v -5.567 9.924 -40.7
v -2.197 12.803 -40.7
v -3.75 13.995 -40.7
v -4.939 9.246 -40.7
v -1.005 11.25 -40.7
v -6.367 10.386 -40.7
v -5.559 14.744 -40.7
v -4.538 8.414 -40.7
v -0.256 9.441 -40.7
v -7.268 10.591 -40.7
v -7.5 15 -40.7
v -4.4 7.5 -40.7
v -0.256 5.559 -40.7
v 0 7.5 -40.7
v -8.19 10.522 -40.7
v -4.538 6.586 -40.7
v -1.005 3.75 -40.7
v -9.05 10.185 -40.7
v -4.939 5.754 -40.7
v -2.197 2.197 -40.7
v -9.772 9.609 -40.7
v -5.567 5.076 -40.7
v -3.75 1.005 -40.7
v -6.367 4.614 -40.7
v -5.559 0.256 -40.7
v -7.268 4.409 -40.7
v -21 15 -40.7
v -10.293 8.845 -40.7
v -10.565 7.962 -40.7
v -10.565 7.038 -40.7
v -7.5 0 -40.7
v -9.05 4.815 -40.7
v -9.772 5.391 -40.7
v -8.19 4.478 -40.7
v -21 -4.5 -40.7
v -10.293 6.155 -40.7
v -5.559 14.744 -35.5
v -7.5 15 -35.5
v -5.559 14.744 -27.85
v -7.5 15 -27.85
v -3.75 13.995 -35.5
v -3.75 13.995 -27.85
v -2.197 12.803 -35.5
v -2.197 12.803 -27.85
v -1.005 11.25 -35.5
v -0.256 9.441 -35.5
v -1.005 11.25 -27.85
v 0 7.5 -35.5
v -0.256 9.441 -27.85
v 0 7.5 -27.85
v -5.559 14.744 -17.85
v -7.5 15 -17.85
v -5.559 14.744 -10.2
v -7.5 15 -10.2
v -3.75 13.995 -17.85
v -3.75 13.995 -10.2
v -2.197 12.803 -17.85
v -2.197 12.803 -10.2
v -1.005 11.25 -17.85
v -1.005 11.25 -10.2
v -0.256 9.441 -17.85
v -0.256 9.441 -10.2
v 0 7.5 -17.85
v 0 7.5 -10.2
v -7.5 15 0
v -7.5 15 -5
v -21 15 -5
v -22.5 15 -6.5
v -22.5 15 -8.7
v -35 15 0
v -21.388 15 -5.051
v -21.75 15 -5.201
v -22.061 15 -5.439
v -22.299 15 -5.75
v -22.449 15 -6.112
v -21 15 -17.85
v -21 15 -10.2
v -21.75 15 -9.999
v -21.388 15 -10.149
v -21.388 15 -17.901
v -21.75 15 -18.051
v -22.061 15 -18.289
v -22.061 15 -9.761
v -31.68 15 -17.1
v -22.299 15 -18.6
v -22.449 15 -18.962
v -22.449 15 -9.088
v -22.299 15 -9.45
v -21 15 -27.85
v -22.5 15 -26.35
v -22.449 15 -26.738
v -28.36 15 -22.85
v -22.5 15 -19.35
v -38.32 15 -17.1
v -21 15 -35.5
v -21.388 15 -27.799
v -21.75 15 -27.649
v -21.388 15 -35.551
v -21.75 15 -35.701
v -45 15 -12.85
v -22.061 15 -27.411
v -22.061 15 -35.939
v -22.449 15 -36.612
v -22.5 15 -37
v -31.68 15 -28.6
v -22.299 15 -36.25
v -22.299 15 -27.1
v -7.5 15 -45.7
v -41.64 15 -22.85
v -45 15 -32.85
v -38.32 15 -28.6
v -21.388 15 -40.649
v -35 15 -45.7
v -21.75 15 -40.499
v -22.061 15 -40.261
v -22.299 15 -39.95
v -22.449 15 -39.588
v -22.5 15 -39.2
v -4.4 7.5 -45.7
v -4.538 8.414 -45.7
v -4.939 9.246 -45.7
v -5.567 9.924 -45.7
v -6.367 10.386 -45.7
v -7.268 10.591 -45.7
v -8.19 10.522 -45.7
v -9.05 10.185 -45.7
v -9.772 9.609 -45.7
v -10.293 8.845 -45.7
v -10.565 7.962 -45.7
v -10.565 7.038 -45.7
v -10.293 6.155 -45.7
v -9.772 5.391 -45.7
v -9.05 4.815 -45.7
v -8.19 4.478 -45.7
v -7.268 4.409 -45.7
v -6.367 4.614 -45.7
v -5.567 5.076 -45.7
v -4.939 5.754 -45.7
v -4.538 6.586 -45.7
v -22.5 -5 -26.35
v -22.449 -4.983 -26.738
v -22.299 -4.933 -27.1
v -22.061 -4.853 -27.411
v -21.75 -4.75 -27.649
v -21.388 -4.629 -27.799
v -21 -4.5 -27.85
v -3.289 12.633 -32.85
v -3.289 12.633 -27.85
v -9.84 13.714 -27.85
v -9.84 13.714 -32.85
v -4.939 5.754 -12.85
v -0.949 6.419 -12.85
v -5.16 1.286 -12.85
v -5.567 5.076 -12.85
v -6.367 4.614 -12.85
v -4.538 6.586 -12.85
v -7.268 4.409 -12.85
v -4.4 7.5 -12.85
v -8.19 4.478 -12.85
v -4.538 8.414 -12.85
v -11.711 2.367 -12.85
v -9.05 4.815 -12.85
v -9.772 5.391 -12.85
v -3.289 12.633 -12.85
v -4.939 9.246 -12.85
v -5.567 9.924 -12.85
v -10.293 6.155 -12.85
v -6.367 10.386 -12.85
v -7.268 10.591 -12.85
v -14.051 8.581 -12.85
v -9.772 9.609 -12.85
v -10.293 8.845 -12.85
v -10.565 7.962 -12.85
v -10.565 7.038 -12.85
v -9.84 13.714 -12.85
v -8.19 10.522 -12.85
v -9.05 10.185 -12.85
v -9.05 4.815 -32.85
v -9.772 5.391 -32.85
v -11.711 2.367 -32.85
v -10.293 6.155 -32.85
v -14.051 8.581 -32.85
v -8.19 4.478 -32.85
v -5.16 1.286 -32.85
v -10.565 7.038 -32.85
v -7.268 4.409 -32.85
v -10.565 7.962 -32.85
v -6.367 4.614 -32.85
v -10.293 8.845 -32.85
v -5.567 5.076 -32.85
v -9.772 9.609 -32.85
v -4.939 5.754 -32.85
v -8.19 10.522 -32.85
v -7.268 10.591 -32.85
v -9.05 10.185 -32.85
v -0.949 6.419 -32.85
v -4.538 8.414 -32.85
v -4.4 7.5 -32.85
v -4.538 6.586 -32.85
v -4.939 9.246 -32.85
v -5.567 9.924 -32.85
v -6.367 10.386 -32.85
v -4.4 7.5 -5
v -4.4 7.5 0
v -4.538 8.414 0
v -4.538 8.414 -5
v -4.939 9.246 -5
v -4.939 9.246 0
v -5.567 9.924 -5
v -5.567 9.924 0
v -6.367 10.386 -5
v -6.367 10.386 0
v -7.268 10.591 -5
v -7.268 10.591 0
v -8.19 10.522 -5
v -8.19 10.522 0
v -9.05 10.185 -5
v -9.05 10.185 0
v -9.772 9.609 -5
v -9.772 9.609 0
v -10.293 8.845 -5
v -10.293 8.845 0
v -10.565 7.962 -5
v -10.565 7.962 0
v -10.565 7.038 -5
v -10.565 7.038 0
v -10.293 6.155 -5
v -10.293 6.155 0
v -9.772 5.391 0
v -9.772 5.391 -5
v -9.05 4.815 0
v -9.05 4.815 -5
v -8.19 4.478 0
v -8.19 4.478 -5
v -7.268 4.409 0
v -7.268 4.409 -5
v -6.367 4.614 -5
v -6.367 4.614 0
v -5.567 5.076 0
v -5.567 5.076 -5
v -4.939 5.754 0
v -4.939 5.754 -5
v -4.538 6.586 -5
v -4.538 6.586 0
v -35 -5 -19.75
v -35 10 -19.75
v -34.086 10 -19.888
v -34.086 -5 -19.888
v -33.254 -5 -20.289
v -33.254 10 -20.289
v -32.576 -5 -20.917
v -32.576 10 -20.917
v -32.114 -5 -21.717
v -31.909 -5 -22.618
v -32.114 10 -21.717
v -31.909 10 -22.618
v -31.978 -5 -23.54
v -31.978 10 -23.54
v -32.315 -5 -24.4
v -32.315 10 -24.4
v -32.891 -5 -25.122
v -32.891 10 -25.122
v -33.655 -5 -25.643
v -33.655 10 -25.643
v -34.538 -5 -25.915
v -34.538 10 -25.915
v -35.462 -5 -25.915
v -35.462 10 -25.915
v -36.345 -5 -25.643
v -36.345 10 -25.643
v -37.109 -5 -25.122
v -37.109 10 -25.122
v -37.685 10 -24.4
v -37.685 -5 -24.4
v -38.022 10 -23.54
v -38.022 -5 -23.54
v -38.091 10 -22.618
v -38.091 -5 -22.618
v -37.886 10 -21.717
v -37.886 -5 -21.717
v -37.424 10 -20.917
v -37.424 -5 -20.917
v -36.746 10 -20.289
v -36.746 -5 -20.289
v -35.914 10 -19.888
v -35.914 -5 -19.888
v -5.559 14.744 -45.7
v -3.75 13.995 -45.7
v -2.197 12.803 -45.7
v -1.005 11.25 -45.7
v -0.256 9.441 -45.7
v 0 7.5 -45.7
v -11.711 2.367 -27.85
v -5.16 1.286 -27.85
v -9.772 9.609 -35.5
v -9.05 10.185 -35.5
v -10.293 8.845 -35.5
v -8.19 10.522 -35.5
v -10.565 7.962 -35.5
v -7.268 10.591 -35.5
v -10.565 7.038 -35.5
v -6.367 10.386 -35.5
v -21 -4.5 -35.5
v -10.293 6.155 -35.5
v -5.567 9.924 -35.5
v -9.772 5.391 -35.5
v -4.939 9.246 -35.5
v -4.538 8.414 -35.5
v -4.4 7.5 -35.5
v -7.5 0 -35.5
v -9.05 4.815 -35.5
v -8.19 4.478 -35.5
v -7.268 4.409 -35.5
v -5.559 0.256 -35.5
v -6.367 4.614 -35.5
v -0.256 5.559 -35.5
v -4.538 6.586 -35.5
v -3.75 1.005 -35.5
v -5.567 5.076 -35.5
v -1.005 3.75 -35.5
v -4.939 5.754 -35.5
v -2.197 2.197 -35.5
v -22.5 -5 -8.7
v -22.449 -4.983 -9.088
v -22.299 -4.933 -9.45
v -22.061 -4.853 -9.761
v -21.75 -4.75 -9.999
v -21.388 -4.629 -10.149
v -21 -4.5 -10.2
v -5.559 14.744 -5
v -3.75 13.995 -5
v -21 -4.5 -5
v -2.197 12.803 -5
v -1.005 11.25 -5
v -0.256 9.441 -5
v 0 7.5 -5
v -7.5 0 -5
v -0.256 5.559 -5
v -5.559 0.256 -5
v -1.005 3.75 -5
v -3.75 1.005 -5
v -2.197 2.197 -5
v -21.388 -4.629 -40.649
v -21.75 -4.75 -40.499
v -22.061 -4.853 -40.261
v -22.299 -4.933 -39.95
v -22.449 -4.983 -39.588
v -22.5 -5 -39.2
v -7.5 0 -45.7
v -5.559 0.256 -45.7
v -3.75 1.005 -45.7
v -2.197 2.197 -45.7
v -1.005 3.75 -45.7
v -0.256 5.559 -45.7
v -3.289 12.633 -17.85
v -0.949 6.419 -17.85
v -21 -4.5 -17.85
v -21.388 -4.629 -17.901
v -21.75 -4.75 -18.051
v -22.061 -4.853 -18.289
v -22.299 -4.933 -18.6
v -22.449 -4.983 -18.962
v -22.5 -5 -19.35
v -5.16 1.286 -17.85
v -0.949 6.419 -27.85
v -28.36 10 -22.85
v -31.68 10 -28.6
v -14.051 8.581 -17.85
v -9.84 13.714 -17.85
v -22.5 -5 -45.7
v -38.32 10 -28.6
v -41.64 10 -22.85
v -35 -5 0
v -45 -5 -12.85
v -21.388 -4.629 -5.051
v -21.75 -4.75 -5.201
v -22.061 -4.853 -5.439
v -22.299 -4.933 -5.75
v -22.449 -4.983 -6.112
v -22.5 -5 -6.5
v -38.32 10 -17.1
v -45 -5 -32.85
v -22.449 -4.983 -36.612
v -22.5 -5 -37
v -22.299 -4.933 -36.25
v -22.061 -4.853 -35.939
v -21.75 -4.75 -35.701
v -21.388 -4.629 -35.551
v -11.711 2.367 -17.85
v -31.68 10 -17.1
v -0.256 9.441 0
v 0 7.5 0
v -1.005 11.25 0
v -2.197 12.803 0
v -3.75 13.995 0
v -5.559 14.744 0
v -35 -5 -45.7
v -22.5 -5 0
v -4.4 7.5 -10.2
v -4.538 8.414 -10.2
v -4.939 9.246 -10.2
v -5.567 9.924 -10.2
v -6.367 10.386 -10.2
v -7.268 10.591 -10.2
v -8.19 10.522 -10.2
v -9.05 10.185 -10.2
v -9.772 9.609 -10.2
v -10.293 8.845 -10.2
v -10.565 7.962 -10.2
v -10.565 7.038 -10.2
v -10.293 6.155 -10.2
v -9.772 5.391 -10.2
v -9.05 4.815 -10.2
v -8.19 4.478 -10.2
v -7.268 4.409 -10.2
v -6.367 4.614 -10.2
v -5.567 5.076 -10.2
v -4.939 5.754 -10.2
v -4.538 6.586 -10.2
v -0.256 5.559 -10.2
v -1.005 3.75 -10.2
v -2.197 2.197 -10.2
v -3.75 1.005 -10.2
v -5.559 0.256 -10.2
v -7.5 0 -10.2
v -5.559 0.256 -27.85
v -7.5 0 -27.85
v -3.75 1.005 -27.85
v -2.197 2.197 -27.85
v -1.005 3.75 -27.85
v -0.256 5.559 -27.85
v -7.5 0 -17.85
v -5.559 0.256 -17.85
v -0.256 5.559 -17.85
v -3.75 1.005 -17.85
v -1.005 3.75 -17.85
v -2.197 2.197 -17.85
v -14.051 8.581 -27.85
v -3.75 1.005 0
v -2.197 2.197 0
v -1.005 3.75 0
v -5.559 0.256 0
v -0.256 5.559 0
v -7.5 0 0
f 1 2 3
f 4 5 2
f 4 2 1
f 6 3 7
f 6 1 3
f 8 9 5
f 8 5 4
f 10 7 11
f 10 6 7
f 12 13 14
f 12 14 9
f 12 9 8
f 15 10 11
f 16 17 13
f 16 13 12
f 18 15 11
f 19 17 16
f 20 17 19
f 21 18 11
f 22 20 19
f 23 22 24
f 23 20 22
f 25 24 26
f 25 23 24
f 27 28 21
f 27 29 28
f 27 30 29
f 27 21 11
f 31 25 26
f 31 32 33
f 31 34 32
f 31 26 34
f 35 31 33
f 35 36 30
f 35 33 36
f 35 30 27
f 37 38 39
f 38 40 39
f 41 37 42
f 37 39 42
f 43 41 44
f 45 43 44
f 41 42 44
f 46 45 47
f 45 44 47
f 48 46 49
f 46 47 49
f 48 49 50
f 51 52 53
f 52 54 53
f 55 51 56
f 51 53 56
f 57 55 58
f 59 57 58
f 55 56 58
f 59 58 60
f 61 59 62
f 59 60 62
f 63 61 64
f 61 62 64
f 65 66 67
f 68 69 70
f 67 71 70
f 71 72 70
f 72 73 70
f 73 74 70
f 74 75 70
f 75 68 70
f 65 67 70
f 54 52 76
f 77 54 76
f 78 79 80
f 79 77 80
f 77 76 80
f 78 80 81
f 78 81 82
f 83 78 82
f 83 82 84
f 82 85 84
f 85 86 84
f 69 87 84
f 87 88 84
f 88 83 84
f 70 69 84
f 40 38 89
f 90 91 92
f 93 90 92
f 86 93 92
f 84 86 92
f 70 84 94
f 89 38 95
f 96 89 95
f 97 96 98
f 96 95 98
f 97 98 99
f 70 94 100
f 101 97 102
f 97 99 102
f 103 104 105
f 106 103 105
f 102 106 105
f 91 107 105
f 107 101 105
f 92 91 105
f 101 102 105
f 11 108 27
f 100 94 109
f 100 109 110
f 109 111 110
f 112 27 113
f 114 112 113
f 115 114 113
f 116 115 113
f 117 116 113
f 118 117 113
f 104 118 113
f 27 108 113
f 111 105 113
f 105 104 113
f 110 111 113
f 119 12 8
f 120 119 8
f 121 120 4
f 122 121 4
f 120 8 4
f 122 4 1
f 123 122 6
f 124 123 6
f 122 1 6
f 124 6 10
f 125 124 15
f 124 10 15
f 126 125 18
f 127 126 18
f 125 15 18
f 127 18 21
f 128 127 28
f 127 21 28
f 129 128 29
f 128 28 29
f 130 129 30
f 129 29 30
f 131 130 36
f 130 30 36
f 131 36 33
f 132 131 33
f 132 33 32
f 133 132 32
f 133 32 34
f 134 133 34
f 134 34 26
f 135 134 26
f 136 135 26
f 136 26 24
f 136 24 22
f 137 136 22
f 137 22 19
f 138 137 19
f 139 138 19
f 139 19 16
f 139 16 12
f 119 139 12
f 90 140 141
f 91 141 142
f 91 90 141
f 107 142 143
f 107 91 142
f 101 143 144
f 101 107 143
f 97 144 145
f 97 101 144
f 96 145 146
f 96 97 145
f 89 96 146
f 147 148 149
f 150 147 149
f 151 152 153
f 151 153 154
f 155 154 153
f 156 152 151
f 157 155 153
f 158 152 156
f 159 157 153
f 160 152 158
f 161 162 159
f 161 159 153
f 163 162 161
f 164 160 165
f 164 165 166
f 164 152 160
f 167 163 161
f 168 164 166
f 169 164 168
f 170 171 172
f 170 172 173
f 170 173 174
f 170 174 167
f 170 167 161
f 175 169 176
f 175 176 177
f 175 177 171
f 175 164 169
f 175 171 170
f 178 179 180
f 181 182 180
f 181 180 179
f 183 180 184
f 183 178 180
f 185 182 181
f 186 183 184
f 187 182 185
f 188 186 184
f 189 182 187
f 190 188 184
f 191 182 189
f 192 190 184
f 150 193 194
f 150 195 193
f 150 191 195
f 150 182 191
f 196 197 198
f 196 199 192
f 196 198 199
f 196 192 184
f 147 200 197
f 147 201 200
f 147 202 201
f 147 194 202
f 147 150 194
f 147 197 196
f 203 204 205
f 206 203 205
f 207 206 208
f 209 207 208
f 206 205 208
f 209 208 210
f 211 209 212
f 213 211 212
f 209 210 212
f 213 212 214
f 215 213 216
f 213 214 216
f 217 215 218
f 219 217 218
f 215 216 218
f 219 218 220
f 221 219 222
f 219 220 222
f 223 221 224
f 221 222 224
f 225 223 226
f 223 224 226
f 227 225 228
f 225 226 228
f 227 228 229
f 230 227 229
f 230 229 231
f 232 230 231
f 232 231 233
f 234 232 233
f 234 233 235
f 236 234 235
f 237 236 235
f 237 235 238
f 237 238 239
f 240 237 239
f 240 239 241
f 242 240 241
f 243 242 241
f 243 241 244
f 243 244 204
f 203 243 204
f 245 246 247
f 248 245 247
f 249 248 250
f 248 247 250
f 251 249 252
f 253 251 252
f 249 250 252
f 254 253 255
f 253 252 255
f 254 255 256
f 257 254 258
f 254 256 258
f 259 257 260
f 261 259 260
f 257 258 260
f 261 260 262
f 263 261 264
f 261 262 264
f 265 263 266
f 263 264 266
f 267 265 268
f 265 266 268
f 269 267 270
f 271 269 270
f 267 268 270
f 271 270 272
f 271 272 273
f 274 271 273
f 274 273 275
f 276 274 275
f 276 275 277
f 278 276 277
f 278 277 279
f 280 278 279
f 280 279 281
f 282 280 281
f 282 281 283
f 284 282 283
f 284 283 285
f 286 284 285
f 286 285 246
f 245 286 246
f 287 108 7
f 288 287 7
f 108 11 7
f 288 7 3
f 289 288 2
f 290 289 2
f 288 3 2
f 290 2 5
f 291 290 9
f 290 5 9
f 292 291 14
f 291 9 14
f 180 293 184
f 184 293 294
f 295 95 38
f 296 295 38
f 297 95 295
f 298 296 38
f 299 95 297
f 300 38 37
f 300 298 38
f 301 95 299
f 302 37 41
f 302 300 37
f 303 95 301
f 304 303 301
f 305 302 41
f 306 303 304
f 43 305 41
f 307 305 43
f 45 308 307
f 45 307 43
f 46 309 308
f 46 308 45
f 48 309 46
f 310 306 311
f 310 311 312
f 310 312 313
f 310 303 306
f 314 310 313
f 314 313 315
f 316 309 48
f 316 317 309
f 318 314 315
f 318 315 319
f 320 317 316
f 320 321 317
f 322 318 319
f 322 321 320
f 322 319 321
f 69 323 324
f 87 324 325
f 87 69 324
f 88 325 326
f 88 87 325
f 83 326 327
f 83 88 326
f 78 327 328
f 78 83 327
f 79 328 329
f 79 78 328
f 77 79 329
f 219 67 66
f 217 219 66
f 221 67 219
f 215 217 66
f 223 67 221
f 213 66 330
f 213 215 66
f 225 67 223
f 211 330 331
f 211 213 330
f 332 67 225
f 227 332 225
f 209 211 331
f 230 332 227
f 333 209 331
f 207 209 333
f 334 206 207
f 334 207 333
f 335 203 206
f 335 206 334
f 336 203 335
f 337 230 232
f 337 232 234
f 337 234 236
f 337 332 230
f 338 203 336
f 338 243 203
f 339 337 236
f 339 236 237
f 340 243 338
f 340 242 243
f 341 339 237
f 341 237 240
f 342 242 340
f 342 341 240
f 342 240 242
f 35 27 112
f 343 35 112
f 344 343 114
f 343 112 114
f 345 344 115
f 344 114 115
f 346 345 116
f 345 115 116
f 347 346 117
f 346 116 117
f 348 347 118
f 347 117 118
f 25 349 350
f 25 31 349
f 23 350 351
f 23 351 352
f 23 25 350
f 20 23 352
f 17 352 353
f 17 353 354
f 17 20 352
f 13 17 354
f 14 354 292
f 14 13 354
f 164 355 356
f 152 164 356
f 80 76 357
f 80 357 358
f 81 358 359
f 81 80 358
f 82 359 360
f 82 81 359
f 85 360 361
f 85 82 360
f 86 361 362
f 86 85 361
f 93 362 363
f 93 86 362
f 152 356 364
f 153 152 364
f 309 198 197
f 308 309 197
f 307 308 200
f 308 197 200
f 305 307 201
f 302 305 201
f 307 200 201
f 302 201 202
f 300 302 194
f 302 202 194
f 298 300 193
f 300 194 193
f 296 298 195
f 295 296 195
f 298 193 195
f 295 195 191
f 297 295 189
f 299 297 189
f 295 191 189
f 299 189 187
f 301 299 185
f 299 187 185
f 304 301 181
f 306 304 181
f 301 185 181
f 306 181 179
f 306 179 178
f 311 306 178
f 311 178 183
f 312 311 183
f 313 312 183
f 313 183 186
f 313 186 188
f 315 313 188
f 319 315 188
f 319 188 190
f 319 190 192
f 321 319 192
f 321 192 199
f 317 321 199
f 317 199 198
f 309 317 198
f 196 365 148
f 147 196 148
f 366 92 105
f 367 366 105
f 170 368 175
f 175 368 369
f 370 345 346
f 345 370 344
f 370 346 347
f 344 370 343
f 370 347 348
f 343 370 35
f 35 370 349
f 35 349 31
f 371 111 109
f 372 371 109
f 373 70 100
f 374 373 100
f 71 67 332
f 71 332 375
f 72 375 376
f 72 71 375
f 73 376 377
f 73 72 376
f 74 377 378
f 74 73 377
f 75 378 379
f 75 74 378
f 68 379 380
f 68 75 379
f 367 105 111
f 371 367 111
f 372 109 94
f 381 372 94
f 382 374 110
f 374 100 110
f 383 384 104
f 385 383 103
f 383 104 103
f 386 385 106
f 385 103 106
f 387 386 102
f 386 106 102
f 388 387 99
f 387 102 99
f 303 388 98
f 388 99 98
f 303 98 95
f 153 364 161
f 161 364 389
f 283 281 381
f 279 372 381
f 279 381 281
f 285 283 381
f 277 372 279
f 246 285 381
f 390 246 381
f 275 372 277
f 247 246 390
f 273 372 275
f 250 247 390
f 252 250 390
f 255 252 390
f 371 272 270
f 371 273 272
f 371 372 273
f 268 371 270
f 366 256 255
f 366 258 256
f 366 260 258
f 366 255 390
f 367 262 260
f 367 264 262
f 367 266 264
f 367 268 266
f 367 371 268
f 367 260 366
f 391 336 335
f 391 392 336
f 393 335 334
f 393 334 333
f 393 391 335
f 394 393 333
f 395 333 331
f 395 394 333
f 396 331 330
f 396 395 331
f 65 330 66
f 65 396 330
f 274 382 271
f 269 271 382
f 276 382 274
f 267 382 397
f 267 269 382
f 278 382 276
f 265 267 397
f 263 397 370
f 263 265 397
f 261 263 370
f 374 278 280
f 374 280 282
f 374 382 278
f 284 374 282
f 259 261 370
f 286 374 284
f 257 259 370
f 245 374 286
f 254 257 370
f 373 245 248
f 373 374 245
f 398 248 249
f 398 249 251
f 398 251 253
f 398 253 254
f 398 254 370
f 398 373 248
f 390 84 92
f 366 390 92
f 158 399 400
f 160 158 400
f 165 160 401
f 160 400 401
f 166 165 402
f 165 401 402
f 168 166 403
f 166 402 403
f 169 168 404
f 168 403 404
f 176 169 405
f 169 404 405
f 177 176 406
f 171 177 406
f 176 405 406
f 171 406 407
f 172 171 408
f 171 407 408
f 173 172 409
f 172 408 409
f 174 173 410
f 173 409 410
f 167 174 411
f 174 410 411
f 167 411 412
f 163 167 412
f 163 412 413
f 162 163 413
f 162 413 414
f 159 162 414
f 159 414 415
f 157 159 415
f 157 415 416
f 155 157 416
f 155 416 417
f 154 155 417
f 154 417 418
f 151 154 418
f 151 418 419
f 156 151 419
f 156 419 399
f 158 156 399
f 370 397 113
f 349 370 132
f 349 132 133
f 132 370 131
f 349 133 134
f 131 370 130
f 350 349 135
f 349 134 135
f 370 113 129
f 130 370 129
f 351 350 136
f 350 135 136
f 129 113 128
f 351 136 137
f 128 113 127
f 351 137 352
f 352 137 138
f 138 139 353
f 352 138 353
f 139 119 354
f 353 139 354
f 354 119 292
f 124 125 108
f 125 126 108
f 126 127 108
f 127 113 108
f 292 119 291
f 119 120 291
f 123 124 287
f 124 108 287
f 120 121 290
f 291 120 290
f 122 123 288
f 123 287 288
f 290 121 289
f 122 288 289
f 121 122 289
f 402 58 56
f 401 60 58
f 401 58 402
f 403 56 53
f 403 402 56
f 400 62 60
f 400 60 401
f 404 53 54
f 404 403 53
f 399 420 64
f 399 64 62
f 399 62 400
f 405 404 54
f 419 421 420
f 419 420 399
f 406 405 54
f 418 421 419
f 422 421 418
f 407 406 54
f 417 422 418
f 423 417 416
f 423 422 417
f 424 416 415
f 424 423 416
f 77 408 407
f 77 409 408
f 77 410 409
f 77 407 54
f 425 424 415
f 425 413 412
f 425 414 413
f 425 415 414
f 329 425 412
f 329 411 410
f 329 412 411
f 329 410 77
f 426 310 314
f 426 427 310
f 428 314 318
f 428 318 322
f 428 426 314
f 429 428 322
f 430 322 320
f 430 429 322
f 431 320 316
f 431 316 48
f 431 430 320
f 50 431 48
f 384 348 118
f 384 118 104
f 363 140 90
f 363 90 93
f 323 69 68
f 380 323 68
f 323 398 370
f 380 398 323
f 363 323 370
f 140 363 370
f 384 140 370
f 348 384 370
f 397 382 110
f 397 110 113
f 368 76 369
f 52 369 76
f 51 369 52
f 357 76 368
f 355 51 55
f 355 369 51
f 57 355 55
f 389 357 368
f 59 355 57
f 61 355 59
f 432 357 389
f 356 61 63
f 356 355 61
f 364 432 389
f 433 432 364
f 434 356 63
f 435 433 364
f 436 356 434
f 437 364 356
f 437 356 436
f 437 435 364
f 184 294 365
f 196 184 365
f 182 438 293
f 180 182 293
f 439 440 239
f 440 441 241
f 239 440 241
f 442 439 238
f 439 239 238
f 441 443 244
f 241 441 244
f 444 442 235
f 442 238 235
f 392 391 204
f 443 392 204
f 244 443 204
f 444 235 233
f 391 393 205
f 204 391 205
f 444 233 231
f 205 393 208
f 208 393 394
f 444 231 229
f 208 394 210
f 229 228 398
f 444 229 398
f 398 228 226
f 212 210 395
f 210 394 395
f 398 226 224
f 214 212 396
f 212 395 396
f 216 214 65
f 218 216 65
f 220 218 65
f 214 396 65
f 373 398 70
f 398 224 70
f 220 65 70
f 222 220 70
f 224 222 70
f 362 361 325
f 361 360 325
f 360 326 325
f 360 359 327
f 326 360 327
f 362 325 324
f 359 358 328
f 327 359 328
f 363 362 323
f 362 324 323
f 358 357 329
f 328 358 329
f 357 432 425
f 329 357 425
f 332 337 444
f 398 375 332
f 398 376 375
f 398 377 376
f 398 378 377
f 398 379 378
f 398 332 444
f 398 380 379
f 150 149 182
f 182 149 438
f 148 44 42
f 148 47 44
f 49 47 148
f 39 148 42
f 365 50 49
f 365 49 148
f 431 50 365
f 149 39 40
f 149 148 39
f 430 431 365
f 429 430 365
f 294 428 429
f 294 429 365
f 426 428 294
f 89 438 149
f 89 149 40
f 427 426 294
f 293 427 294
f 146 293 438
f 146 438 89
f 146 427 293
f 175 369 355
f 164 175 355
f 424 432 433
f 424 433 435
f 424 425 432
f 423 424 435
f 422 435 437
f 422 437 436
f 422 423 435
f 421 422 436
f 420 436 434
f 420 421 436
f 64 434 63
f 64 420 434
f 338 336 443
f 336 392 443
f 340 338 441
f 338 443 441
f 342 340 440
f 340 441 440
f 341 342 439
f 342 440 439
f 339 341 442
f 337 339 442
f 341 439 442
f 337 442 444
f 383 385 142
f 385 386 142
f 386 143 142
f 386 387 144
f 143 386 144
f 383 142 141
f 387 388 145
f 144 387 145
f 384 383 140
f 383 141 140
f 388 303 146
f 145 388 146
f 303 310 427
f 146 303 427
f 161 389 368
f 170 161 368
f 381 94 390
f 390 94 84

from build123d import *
from OCP.BRepFilletAPI import BRepFilletAPI_MakeChamfer

# Parameters (mm, degrees)
BOSS_EXTRUDE1_DEPTH = 15
CUT_EXTRUDE4_DEPTH  = 5
SKETCH7_R           = 3.1
CUT_EXTRUDE6_DEPTH  = 66.86721491
FILLET1_R           = 7.5
CUT_EXTRUDE7_DEPTH  = 5
CUT_EXTRUDE8_DEPTH  = 5
FILLET2_R           = 1.5
BOSS_EXTRUDE2_DEPTH = 5
SKETCH6_R           = 3.1
CUT_EXTRUDE5_DEPTH  = 66.86721491
CHAMFER8_SIZE       = 15
CHAMFER8_SIZE_2     = 5


with BuildPart() as part:
    # Sketch1 → Boss-Extrude1 (new body)
    with BuildSketch(Plane(origin=(0, 0, 0), x_dir=(1, 0, 0), z_dir=(0, 1, 0))):
        Polygon((0, 0), (-35, 0), (-45, 12.85), (-45, 32.85), (-35, 45.7), (0, 45.7), (0, 40.7), (-22.5, 40.7), (-22.5, 35.5), (0, 35.5), (0, 27.85), (-22.5, 27.85), (-22.5, 17.85), (0, 17.85), (0, 10.2), (-22.5, 10.2), (-22.5, 5), (0, 5), align=None)
    extrude(amount=BOSS_EXTRUDE1_DEPTH)

    # Sketch5 → Cut-Extrude4 (cut)
    with BuildSketch(Plane(origin=(0, 15, 0), x_dir=(1, 0, 0), z_dir=(0, 1, 0))):
        Polygon((-41.639528096, 22.85), (-38.319764048, 17.1), (-31.680235952, 17.1), (-28.360471904, 22.85), (-31.680235952, 28.6), (-38.319764048, 28.6), align=None)
    extrude(amount=-CUT_EXTRUDE4_DEPTH, mode=Mode.SUBTRACT)

    # Sketch7 → Cut-Extrude6 (cut, through all)
    with BuildSketch(Plane.XY):
        with Locations((-7.5, 7.5)):
            Circle(SKETCH7_R)
    extrude(amount=-CUT_EXTRUDE6_DEPTH, mode=Mode.SUBTRACT)

    # Fillet1
    fillet1_edges = [part.edges().sort_by_distance(p)[0] for p in [
        (0, 0, -43.2),
        (0, 0, -31.675),
        (0, 0, -2.5),
        (0, 15, -43.2),
        (0, 15, -31.675),
        (0, 15, -2.5),
        (0, 0, -14.025),
        (0, 15, -14.025),
    ]]
    fillet(fillet1_edges, radius=FILLET1_R - 0.0001)  # a hair under: the kernel refuses the full size

    # Sketch8 → Cut-Extrude7 (cut)
    with BuildSketch(Plane.XY.offset(-27.85)):
        Polygon((-9.839641819, 13.713647036), (-14.050997093, 8.580634267), (-11.711355274, 2.366987231), (-5.160358181, 1.286352964), (-0.949002907, 6.419365733), (-3.288644726, 12.633012769), align=None)
    extrude(amount=-CUT_EXTRUDE7_DEPTH, mode=Mode.SUBTRACT)

    # Sketch9 → Cut-Extrude8 (cut)
    with BuildSketch(Plane(origin=(0, 0, -17.85), x_dir=(-1, 0, 0), z_dir=(0, 0, -1))):
        Polygon((9.839641819, 13.713647036), (3.288644726, 12.633012769), (0.949002907, 6.419365733), (5.160358181, 1.286352964), (11.711355274, 2.366987231), (14.050997093, 8.580634267), align=None)
    extrude(amount=-CUT_EXTRUDE8_DEPTH, mode=Mode.SUBTRACT)

    # Fillet2
    fillet2_edges = [part.edges().sort_by_distance(p)[0] for p in [
        (-22.5, 7.5, -40.7),
        (-22.5, 7.5, -35.5),
        (-22.5, 7.5, -27.85),
        (-22.5, 7.5, -17.85),
        (-22.5, 7.5, -10.2),
        (-22.5, 7.5, -5),
    ]]
    fillet(fillet2_edges, radius=FILLET2_R)

    # Sketch15 → Boss-Extrude2 (add)
    with BuildSketch(Plane.XZ):
        Polygon((-35, 0), (-45, -12.85), (-45, -32.85), (-35, -45.7), (-22.5, -45.7), (-22.5, 0), align=None)
    extrude(amount=BOSS_EXTRUDE2_DEPTH)

    # Sketch6 → Cut-Extrude5 (cut, through all)
    with BuildSketch(Plane(origin=(0, 10, 0), x_dir=(1, 0, 0), z_dir=(0, 1, 0))):
        with Locations(Location((-35, 22.85, 0), (0, 0, 270))):
            Circle(SKETCH6_R)
    extrude(amount=-CUT_EXTRUDE5_DEPTH, mode=Mode.SUBTRACT)

    # Chamfer8
    chamfer8_edges_1 = [part.edges().sort_by_distance(p)[0] for p in [
        (-22.5, 0, -3.25),
    ]]
    chamfer8_side_1 = [part.faces().sort_by_distance(p)[0] for p in [
        (-22.4, 0, -3.25),
    ]]
    chamfer8_edges_2 = [part.edges().sort_by_distance(p)[0] for p in [
        (-22.5, 0, -42.45),
    ]]
    chamfer8_side_2 = [part.faces().sort_by_distance(p)[0] for p in [
        (-22.5, -0.1, -42.45),
    ]]
    chamfer8_edges_3 = [part.edges().sort_by_distance(p)[0] for p in [
        (-22.5, 0, -14.025),
    ]]
    chamfer8_side_3 = [part.faces().sort_by_distance(p)[0] for p in [
        (-22.5, -0.1, -14.025),
    ]]
    chamfer8_edges_4 = [part.edges().sort_by_distance(p)[0] for p in [
        (-22.5, 0, -31.675),
    ]]
    chamfer8_side_4 = [part.faces().sort_by_distance(p)[0] for p in [
        (-22.5, -0.1, -31.675),
    ]]
    chamfer8 = BRepFilletAPI_MakeChamfer(part.part.solid().wrapped)
    for e in chamfer8_edges_1:
        chamfer8.Add(CHAMFER8_SIZE - 0.0001, CHAMFER8_SIZE_2 - 0.0001, e.wrapped, chamfer8_side_1[0].wrapped)
    for e in chamfer8_edges_2:
        chamfer8.Add(CHAMFER8_SIZE_2 - 0.0001, CHAMFER8_SIZE - 0.0001, e.wrapped, chamfer8_side_2[0].wrapped)
    for e in chamfer8_edges_3:
        chamfer8.Add(CHAMFER8_SIZE_2 - 0.0001, CHAMFER8_SIZE - 0.0001, e.wrapped, chamfer8_side_3[0].wrapped)
    for e in chamfer8_edges_4:
        chamfer8.Add(CHAMFER8_SIZE_2 - 0.0001, CHAMFER8_SIZE - 0.0001, e.wrapped, chamfer8_side_4[0].wrapped)
    add(Compound.cast(chamfer8.Shape()), mode=Mode.REPLACE)  # a hair under: the kernel refuses the full size


solid = part.part
